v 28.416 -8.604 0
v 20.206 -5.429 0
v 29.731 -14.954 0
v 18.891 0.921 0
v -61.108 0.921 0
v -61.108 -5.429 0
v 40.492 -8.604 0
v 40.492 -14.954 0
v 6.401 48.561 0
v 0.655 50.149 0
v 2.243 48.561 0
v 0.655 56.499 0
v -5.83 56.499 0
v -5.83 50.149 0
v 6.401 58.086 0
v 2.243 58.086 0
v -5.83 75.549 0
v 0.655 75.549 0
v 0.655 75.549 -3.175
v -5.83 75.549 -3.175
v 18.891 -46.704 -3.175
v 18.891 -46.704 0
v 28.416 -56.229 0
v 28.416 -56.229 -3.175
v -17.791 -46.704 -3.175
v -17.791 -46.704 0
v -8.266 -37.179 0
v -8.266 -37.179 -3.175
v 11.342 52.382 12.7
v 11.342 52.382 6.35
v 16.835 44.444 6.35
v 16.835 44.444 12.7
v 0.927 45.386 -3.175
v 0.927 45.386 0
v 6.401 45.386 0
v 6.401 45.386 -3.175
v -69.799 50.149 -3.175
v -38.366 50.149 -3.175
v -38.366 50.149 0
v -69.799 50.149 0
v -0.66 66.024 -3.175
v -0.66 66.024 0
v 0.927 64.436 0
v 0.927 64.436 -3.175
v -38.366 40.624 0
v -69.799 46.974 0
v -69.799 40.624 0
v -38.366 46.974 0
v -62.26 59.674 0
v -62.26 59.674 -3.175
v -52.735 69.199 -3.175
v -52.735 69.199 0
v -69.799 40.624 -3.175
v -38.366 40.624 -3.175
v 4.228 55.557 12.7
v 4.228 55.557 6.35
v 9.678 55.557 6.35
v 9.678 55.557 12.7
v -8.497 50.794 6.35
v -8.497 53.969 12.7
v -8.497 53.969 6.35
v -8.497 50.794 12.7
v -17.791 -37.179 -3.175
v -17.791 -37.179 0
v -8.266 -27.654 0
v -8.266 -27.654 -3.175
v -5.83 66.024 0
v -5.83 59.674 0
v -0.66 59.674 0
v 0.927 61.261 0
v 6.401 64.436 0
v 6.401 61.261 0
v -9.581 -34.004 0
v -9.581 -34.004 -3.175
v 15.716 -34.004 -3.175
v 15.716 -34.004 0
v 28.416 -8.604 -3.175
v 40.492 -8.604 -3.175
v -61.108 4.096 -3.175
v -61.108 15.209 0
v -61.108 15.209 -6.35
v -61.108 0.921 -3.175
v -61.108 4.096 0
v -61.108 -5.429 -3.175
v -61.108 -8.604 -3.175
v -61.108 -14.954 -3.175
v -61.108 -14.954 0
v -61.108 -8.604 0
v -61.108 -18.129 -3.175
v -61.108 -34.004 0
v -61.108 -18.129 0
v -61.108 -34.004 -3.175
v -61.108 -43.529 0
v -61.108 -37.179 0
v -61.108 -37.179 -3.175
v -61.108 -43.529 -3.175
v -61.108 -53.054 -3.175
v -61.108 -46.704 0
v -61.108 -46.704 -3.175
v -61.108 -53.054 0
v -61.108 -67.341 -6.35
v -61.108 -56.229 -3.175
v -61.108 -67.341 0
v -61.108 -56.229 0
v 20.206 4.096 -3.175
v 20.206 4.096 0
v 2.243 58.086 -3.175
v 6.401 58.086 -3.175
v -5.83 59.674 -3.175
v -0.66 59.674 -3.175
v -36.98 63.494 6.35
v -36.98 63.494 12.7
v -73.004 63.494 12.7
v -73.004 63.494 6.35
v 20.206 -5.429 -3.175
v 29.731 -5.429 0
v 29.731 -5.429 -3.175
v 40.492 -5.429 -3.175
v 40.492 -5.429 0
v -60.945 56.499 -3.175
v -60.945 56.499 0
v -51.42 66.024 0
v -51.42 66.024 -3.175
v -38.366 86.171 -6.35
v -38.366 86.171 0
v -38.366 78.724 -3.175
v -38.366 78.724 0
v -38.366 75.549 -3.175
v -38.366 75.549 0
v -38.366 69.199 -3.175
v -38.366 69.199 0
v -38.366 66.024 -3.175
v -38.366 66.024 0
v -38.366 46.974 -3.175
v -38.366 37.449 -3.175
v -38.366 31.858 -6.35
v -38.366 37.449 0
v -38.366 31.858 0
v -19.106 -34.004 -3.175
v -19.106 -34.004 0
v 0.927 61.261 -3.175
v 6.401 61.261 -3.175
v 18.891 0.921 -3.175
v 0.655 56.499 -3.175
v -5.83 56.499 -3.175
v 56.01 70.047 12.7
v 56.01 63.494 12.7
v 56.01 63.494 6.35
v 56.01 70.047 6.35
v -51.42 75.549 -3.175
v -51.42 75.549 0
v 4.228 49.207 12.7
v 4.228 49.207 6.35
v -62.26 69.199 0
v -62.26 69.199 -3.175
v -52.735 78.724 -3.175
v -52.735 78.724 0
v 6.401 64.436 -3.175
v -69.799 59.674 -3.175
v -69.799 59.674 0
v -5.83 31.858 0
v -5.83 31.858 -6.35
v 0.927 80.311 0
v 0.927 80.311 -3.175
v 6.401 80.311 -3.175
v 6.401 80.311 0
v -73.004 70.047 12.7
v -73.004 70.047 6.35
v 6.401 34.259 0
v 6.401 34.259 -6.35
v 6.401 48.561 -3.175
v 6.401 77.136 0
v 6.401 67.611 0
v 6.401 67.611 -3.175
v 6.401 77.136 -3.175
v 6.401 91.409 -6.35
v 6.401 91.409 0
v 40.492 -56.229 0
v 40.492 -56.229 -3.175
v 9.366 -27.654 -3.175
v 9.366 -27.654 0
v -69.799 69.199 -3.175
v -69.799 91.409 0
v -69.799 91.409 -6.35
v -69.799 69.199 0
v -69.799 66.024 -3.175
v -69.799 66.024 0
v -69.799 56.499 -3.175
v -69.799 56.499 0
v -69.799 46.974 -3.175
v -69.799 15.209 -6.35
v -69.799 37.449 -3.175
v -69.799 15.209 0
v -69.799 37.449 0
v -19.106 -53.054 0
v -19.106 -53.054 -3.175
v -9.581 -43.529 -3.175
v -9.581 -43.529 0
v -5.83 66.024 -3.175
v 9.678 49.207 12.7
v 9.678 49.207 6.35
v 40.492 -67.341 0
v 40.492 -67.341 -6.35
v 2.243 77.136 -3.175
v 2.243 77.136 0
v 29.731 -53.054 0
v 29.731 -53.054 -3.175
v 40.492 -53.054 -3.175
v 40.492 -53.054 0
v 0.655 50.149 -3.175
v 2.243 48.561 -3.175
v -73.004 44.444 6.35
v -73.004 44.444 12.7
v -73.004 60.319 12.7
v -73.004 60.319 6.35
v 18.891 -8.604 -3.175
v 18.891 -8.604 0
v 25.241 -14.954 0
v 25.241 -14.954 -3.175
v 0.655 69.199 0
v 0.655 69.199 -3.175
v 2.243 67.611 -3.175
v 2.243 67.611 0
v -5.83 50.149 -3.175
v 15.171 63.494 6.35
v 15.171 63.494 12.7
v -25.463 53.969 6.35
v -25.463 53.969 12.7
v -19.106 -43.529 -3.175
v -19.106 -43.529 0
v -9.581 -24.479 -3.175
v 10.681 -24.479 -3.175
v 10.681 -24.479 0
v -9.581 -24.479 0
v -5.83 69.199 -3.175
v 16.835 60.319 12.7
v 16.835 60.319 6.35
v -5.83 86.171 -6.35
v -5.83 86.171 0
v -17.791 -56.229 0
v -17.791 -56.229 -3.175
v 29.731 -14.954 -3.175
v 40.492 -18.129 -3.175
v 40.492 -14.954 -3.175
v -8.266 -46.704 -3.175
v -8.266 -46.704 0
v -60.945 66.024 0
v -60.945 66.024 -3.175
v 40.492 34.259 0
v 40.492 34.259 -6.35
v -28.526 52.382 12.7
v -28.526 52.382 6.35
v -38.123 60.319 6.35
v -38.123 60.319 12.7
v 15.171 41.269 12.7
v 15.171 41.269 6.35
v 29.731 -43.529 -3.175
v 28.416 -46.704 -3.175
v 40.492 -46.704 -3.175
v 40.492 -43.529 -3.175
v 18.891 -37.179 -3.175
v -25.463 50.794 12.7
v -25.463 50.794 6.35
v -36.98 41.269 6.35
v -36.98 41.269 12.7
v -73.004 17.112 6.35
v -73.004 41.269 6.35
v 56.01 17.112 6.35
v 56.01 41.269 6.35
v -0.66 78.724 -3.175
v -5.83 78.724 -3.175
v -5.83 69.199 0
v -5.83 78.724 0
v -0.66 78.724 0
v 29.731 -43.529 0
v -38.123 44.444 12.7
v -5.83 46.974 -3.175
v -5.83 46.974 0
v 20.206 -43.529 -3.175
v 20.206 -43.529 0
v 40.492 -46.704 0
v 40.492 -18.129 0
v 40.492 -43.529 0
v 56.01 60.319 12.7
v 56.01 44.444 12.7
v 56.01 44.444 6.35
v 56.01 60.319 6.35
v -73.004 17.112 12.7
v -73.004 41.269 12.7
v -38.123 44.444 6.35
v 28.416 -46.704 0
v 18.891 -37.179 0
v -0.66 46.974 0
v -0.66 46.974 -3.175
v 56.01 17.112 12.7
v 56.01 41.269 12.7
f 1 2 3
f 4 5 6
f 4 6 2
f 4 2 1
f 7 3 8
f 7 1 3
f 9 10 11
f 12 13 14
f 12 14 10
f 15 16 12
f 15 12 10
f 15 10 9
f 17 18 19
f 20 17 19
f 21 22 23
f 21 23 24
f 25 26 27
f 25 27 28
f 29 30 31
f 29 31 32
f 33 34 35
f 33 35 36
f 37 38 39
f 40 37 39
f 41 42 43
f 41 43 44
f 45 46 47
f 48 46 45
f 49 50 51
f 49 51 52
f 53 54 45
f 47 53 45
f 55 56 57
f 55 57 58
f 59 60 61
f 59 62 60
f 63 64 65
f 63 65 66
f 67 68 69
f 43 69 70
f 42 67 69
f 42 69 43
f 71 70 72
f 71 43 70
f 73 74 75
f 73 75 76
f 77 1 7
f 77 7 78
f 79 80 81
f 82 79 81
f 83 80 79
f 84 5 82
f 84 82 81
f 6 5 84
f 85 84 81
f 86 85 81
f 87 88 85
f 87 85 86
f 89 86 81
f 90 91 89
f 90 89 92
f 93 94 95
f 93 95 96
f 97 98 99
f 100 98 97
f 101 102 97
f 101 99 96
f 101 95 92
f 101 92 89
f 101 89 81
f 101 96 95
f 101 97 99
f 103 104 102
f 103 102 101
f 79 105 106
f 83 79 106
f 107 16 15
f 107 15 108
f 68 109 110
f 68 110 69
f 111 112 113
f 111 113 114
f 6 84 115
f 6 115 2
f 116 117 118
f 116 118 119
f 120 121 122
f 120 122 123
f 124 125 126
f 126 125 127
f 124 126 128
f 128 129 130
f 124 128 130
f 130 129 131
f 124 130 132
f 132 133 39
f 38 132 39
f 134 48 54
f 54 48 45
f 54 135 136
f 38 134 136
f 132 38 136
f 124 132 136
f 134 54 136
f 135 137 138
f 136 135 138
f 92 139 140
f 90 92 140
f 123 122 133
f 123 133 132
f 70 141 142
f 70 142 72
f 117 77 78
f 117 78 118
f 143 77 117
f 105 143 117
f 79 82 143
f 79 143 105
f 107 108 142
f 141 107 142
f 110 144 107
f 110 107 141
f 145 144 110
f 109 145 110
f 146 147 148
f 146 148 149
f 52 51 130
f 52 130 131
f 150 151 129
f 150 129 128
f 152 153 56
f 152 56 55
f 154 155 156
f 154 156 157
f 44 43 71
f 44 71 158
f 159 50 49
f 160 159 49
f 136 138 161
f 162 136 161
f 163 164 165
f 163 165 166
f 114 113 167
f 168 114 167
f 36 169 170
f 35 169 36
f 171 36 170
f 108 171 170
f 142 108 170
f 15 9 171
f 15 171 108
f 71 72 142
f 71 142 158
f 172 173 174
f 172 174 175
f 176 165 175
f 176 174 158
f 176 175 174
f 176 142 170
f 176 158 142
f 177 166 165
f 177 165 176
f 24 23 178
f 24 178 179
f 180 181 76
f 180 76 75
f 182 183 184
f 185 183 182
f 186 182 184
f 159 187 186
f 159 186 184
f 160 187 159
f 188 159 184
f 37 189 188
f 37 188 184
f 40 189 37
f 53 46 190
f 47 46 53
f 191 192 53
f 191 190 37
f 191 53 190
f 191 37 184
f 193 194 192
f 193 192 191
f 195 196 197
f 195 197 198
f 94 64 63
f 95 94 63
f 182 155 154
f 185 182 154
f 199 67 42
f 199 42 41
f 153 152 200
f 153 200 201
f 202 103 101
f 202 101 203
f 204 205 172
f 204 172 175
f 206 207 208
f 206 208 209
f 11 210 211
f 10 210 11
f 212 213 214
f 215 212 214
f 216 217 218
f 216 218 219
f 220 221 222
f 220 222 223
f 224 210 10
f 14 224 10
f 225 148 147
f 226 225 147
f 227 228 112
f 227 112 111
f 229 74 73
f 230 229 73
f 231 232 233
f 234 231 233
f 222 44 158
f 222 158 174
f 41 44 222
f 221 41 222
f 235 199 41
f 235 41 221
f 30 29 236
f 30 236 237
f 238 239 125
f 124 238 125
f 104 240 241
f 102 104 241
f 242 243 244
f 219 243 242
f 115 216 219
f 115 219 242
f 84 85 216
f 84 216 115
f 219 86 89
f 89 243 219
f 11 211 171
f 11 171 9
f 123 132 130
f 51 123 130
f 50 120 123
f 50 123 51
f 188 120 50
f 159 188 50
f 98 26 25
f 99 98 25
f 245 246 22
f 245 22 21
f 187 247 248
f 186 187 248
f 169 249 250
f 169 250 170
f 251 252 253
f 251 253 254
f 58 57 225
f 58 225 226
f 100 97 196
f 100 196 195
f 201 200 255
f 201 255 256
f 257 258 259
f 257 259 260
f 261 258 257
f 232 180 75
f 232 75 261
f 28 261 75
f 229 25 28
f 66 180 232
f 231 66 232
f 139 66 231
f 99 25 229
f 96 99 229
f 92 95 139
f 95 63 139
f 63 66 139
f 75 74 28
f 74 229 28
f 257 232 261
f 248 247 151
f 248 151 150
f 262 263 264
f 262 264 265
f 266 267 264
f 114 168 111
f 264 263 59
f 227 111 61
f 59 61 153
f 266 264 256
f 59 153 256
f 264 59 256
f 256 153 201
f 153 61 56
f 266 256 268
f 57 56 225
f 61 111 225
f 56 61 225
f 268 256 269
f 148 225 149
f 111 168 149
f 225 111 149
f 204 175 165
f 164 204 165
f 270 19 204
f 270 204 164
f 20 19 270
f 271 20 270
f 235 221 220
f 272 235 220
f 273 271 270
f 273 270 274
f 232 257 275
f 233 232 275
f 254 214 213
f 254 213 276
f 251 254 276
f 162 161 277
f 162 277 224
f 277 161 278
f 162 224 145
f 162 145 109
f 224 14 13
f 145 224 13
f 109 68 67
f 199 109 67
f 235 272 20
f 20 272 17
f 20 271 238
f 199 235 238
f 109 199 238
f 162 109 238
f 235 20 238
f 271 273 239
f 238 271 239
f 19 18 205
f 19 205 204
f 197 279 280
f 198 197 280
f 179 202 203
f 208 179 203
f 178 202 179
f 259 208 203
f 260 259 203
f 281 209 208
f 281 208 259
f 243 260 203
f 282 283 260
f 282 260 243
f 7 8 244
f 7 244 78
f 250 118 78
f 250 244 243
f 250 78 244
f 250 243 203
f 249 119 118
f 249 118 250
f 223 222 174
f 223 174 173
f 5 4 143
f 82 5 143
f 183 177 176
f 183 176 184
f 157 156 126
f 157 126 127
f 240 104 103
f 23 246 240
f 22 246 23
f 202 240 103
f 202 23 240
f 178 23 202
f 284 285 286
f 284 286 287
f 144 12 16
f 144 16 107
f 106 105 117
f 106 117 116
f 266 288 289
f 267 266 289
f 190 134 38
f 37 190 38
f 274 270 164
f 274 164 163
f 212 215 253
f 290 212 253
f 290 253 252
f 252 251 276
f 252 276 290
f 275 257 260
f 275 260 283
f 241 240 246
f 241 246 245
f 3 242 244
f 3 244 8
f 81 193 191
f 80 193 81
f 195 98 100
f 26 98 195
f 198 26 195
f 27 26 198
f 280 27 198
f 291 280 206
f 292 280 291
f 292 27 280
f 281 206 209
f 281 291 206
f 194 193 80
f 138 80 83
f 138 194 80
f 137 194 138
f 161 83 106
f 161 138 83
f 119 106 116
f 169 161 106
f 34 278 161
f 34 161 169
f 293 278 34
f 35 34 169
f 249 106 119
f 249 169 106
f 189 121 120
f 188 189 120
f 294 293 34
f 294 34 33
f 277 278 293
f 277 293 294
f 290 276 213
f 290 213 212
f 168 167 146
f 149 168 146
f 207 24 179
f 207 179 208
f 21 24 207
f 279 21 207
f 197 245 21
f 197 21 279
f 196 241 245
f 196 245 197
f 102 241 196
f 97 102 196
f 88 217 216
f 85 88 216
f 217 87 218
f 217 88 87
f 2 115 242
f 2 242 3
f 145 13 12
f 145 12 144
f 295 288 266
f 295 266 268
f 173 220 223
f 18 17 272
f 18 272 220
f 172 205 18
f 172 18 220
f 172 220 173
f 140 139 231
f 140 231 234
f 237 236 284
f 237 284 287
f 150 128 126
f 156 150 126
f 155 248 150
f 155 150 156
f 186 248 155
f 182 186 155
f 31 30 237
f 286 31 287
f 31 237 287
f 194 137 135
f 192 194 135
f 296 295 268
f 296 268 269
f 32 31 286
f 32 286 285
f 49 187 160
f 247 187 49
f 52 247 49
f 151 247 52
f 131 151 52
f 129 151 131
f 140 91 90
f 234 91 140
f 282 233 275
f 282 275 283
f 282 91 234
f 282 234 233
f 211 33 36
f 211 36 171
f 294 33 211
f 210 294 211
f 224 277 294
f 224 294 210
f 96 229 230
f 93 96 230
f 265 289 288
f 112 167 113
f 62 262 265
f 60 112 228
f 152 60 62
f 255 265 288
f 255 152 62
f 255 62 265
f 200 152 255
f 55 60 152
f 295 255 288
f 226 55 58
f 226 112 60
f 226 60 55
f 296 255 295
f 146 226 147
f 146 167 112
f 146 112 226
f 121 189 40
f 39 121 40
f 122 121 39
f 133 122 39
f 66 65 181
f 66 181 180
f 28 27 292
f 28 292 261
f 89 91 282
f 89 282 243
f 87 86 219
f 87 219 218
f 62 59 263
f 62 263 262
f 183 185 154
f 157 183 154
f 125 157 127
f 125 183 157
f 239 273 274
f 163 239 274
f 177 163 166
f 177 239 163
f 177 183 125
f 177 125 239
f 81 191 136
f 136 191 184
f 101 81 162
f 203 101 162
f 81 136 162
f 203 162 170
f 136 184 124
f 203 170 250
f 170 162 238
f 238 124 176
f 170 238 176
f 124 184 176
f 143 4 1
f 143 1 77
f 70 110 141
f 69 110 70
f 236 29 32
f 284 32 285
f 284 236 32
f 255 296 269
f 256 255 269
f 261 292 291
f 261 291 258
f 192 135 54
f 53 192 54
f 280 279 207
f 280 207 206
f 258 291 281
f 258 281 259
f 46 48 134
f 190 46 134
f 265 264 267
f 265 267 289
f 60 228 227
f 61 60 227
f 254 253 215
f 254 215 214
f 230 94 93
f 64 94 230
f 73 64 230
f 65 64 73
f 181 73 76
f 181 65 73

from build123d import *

# Parameters (mm, degrees)
F0_W      = 67.5092114359
F0_H      = 19.05
F1_DEPTH  = 6.35
F3_W      = 3.175
F3_H      = 3.175
F11_DEPTH = 6.351
F12_W     = 3.175
F12_H     = 3.175
F17_W     = 3.175
F17_H     = 3.175
F23_W     = 129.0142796934
F23_H     = 52.9354959726
F24_DEPTH = 6.35
F26_W     = 3.175
F26_H     = 6.35
F29_W     = 3.175
F29_H     = 6.35


with BuildPart() as f1:
    # F0 (on Top) → F1 (new body)
    with BuildSketch(Plane.XY):
        with Locations((-27.3533369526, 24.7335730806)):
            Rectangle(F0_W, F0_H)
        Polygon((40.4920573294, 34.2585730806), (6.4012687653, 34.2585730806), (6.4012687653, 15.2085730806), (-61.1079426706, 15.2085730806), (-61.1079426706, -67.3414269194), (40.4920573294, -67.3414269194), align=None)
        Polygon((-61.1079426706, 15.2085730806), (-61.1079426706, 34.2585730806), (6.4012687653, 34.2585730806), (6.4012687653, 91.4085730806), (-69.7987312347, 91.4085730806), (-69.7987312347, 15.2085730806), align=None)
    extrude(amount=-F1_DEPTH)

    # F4: sweep along a path in F2
    with BuildLine(Plane.XY) as f4_path:
        Line((40.4920573294, -54.6414269194), (29.0739262488, -54.6414269194))
        Line((29.0739262488, -54.6414269194), (19.5489262488, -45.1164269194))
        Line((19.5489262488, -45.1164269194), (-8.9234185219, -45.1164269194))
        Line((-8.9234185219, -45.1164269194), (-18.4484185219, -54.6414269194))
        Line((-18.4484185219, -54.6414269194), (-61.1079426706, -54.6414269194))
    # F3 (on face) → F4 (sweep, cut)
    with BuildSketch(Plane.YZ.offset(40.4920573294)):
        with Locations((-54.6414269194, -1.5875)):
            Rectangle(F3_W, F3_H)
    sweep(path=f4_path.line, transition=Transition.RIGHT, mode=Mode.SUBTRACT)

    # F5: sweep along a path in F2
    with BuildLine(Plane.XY) as f5_path:
        Line((40.4920573294, -45.1164269194), (29.0739262488, -45.1164269194))
        Line((29.0739262488, -45.1164269194), (19.5489262488, -35.5914269194))
        Line((19.5489262488, -35.5914269194), (-8.9234185219, -35.5914269194))
        Line((-8.9234185219, -35.5914269194), (-18.4484185219, -45.1164269194))
        Line((-18.4484185219, -45.1164269194), (-61.1079426706, -45.1164269194))
    # F3 (on face) → F5 (sweep, cut)
    with BuildSketch(Plane.YZ.offset(40.4920573294)):
        with Locations((-45.1164269194, -1.5875)):
            Rectangle(F3_W, F3_H)
    sweep(path=f5_path.line, transition=Transition.RIGHT, mode=Mode.SUBTRACT)

    # F6: sweep along a path in F2
    with BuildLine(Plane.XY) as f6_path:
        Line((40.4920573294, -45.1164269194), (29.0739262488, -45.1164269194))
        Line((29.0739262488, -45.1164269194), (19.5489262488, -35.5914269194))
        Line((19.5489262488, -35.5914269194), (10.0239262488, -26.0664269194))
        Line((10.0239262488, -26.0664269194), (-8.9234185219, -26.0664269194))
        Line((-8.9234185219, -26.0664269194), (-18.4484185219, -35.5914269194))
        Line((-18.4484185219, -35.5914269194), (-61.1079426706, -35.5914269194))
    # F3 (on face) → F6 (sweep, cut)
    with BuildSketch(Plane.YZ.offset(40.4920573294)):
        with Locations((-45.1164269194, -1.5875)):
            Rectangle(F3_W, F3_H)
    sweep(path=f6_path.line, transition=Transition.RIGHT, mode=Mode.SUBTRACT)

    # F7: sweep along a path in F2
    with BuildLine(Plane.XY) as f7_path:
        Line((40.4920573294, -16.5414269194), (29.0739262488, -16.5414269194))
        Line((29.0739262488, -16.5414269194), (-61.1079426706, -16.5414269194))
    # F3 (on face) → F7 (sweep, cut)
    with BuildSketch(Plane.YZ.offset(40.4920573294)):
        with Locations((-16.5414269194, -1.5875)):
            Rectangle(F3_W, F3_H)
    sweep(path=f7_path.line, mode=Mode.SUBTRACT)

    # F8: sweep along a path in F2
    with BuildLine(Plane.XY) as f8_path:
        Line((40.4920573294, -16.5414269194), (29.0739262488, -16.5414269194))
        Line((29.0739262488, -16.5414269194), (19.5489262488, -7.0164269194))
        Line((19.5489262488, -7.0164269194), (-61.1079426706, -7.0164269194))
    # F3 (on face) → F8 (sweep, cut)
    with BuildSketch(Plane.YZ.offset(40.4920573294)):
        with Locations((-16.5414269194, -1.5875)):
            Rectangle(F3_W, F3_H)
    sweep(path=f8_path.line, transition=Transition.RIGHT, mode=Mode.SUBTRACT)

    # F9: sweep along a path in F2
    with BuildLine(Plane.XY) as f9_path:
        Line((40.4920573294, -7.0164269194), (29.0739262488, -7.0164269194))
        Line((29.0739262488, -7.0164269194), (19.5489262488, 2.5085730806))
        Line((19.5489262488, 2.5085730806), (-61.1079426706, 2.5085730806))
    # F3 (on face) → F9 (sweep, cut)
    with BuildSketch(Plane.YZ.offset(40.4920573294)):
        with Locations((-7.0164269194, -1.5875)):
            Rectangle(F3_W, F3_H)
    sweep(path=f9_path.line, transition=Transition.RIGHT, mode=Mode.SUBTRACT)

    # F10 (on face) → F11 (cut, through all)
    with BuildSketch(Plane.XY):
        Polygon((-5.8296445429, 86.1708798528), (-38.3664250046, 86.1708798528), (-38.3664250046, 77.1361727774), (-38.3664250046, 67.6111727774), (-38.3664250046, 48.5611727774), (-38.3664250046, 39.0361727774), (-38.3664250046, 31.857633692), (-5.8296445429, 31.857633692), (-5.8296445429, 48.5611727774), (-5.8296445429, 58.0861727774), (-5.8296445429, 67.6111727774), (-5.8296445429, 77.1361727774), align=None)
    extrude(amount=-F11_DEPTH, mode=Mode.SUBTRACT)

    # F13: sweep along a path in F10
    with BuildLine(Plane.XY) as f13_path:
        Line((6.4012687653, 46.9736727774), (1.5850432101, 46.9736727774))
        Line((1.5850432101, 46.9736727774), (-0.0024567899, 48.5611727774))
        Line((-0.0024567899, 48.5611727774), (-5.8296445429, 48.5611727774))
    # F12 (on face) → F13 (sweep, cut)
    with BuildSketch(Plane.YZ.offset(6.4012687653)):
        with Locations((46.9736727774, -1.5875)):
            Rectangle(F12_W, F12_H)
    sweep(path=f13_path.line, transition=Transition.RIGHT, mode=Mode.SUBTRACT)

    # F14: sweep along a path in F10
    with BuildLine(Plane.XY) as f14_path:
        Line((6.4012687653, 59.6736727774), (1.5850432101, 59.6736727774))
        Line((1.5850432101, 59.6736727774), (-0.0024567899, 58.0861727774))
        Line((-0.0024567899, 58.0861727774), (-5.8296445429, 58.0861727774))
    # F12 (on face) → F14 (sweep, cut)
    with BuildSketch(Plane.YZ.offset(6.4012687653)):
        with Locations((59.6736727774, -1.5875)):
            Rectangle(F12_W, F12_H)
    sweep(path=f14_path.line, transition=Transition.RIGHT, mode=Mode.SUBTRACT)

    # F15: sweep along a path in F10
    with BuildLine(Plane.XY) as f15_path:
        Line((6.4012687653, 66.0236727774), (1.5850432101, 66.0236727774))
        Line((1.5850432101, 66.0236727774), (-0.0024567899, 67.6111727774))
        Line((-0.0024567899, 67.6111727774), (-5.8296445429, 67.6111727774))
    # F12 (on face) → F15 (sweep, cut)
    with BuildSketch(Plane.YZ.offset(6.4012687653)):
        with Locations((66.0236727774, -1.5875)):
            Rectangle(F12_W, F12_H)
    sweep(path=f15_path.line, transition=Transition.RIGHT, mode=Mode.SUBTRACT)

    # F16: sweep along a path in F10
    with BuildLine(Plane.XY) as f16_path:
        Line((6.4012687653, 78.7236727774), (1.5850432101, 78.7236727774))
        Line((1.5850432101, 78.7236727774), (-0.0024567899, 77.1361727774))
        Line((-0.0024567899, 77.1361727774), (-5.8296445429, 77.1361727774))
    # F12 (on face) → F16 (sweep, cut)
    with BuildSketch(Plane.YZ.offset(6.4012687653)):
        with Locations((78.7236727774, -1.5875)):
            Rectangle(F12_W, F12_H)
    sweep(path=f16_path.line, transition=Transition.RIGHT, mode=Mode.SUBTRACT)

    # F18: sweep along a path in F10
    with BuildLine(Plane.XY) as f18_path:
        Line((-69.7987312347, 39.0361727774), (-38.3664250046, 39.0361727774))
    # F17 (on face) → F18 (sweep, cut)
    with BuildSketch(Plane.YZ.offset(-38.3664250046)):
        with Locations((39.0361727774, -1.5875)):
            Rectangle(F17_W, F17_H)
    sweep(path=f18_path.line, mode=Mode.SUBTRACT)

    # F19: sweep along a path in F10
    with BuildLine(Plane.XY) as f19_path:
        Line((-69.7987312347, 48.5611727774), (-38.3664250046, 48.5611727774))
    # F17 (on face) → F19 (sweep, cut)
    with BuildSketch(Plane.YZ.offset(-38.3664250046)):
        with Locations((48.5611727774, -1.5875)):
            Rectangle(F17_W, F17_H)
    sweep(path=f19_path.line, mode=Mode.SUBTRACT)

    # F20: sweep along a path in F10
    with BuildLine(Plane.XY) as f20_path:
        Line((-38.3664250046, 67.6111727774), (-52.0776462495, 67.6111727774))
        Line((-52.0776462495, 67.6111727774), (-61.6026462495, 58.0861727774))
        Line((-61.6026462495, 58.0861727774), (-69.7987312347, 58.0861727774))
    # F17 (on face) → F20 (sweep, cut)
    with BuildSketch(Plane.YZ.offset(-38.3664250046)):
        with Locations((67.6111727774, -1.5875)):
            Rectangle(F17_W, F17_H)
    sweep(path=f20_path.line, transition=Transition.RIGHT, mode=Mode.SUBTRACT)

    # F21: sweep along a path in F10
    with BuildLine(Plane.XY) as f21_path:
        Line((-38.3664250046, 77.1361727774), (-52.0776462495, 77.1361727774))
        Line((-52.0776462495, 77.1361727774), (-61.6026462495, 67.6111727774))
        Line((-61.6026462495, 67.6111727774), (-69.7987312347, 67.6111727774))
    # F17 (on face) → F21 (sweep, cut)
    with BuildSketch(Plane.YZ.offset(-38.3664250046)):
        with Locations((77.1361727774, -1.5875)):
            Rectangle(F17_W, F17_H)
    sweep(path=f21_path.line, transition=Transition.RIGHT, mode=Mode.SUBTRACT)


with BuildPart() as f24:
    # F23 (on offset) → F24 (new body)
    with BuildSketch(Plane.XY.offset(12.7)):
        with Locations((-8.4969568998, 43.579518795)):
            Rectangle(F23_W, F23_H)
    extrude(amount=-F24_DEPTH)

    # F27: sweep along a path in F25
    with BuildLine(Plane.XY.offset(12.7)) as f27_path:
        Line((56.0101829469, 42.8565069854), (16.0025564314, 42.8565069854))
        Line((16.0025564314, 42.8565069854), (10.5101754889, 50.7940069854))
        Line((10.5101754889, 50.7940069854), (4.2281555943, 50.7940069854))
    # F26 (on face) → F27 (sweep, cut)
    with BuildSketch(Plane.YZ.offset(56.0101829469)):
        with Locations((42.8565069854, 9.525)):
            Rectangle(F26_W, F26_H)
    sweep(path=f27_path.line, transition=Transition.RIGHT, mode=Mode.SUBTRACT)

    # F28: sweep along a path in F25
    with BuildLine(Plane.XY.offset(12.7)) as f28_path:
        Line((56.0101829469, 61.9065069854), (16.0025564314, 61.9065069854))
        Line((16.0025564314, 61.9065069854), (10.5101754889, 53.9690069854))
        Line((10.5101754889, 53.9690069854), (4.2281555943, 53.9690069854))
    # F26 (on face) → F28 (sweep, cut)
    with BuildSketch(Plane.YZ.offset(56.0101829469)):
        with Locations((61.9065069854, 9.525)):
            Rectangle(F26_W, F26_H)
    sweep(path=f28_path.line, transition=Transition.RIGHT, mode=Mode.SUBTRACT)

    # F30: sweep along a path in F25
    with BuildLine(Plane.XY.offset(12.7)) as f30_path:
        Line((-73.0040967464, 61.9065069854), (-37.551264533, 61.9065069854))
        Line((-37.551264533, 61.9065069854), (-26.0349071953, 52.3815069854))
        Line((-26.0349071953, 52.3815069854), (-8.4969559684, 52.3815069854))
    # F29 (on face) → F30 (sweep, cut)
    with BuildSketch(Plane(origin=(-73.0040967464, 0, 0), x_dir=(0, -1, 0), z_dir=(-1, 0, 0))):
        with Locations((-61.9065069854, 9.525)):
            Rectangle(F29_W, F29_H)
    sweep(path=f30_path.line, transition=Transition.RIGHT, mode=Mode.SUBTRACT)

    # F31: sweep along a path in F25
    with BuildLine(Plane.XY.offset(12.7)) as f31_path:
        Line((-73.0040967464, 42.8565069854), (-37.551264533, 42.8565069854))
        Line((-37.551264533, 42.8565069854), (-26.0349071953, 52.3815069854))
    # F29 (on face) → F31 (sweep, cut)
    with BuildSketch(Plane(origin=(-73.0040967464, 0, 0), x_dir=(0, -1, 0), z_dir=(-1, 0, 0))):
        with Locations((-42.8565069854, 9.525)):
            Rectangle(F29_W, F29_H)
    sweep(path=f31_path.line, transition=Transition.RIGHT, mode=Mode.SUBTRACT)


solid = Compound([f1.part, f24.part])
